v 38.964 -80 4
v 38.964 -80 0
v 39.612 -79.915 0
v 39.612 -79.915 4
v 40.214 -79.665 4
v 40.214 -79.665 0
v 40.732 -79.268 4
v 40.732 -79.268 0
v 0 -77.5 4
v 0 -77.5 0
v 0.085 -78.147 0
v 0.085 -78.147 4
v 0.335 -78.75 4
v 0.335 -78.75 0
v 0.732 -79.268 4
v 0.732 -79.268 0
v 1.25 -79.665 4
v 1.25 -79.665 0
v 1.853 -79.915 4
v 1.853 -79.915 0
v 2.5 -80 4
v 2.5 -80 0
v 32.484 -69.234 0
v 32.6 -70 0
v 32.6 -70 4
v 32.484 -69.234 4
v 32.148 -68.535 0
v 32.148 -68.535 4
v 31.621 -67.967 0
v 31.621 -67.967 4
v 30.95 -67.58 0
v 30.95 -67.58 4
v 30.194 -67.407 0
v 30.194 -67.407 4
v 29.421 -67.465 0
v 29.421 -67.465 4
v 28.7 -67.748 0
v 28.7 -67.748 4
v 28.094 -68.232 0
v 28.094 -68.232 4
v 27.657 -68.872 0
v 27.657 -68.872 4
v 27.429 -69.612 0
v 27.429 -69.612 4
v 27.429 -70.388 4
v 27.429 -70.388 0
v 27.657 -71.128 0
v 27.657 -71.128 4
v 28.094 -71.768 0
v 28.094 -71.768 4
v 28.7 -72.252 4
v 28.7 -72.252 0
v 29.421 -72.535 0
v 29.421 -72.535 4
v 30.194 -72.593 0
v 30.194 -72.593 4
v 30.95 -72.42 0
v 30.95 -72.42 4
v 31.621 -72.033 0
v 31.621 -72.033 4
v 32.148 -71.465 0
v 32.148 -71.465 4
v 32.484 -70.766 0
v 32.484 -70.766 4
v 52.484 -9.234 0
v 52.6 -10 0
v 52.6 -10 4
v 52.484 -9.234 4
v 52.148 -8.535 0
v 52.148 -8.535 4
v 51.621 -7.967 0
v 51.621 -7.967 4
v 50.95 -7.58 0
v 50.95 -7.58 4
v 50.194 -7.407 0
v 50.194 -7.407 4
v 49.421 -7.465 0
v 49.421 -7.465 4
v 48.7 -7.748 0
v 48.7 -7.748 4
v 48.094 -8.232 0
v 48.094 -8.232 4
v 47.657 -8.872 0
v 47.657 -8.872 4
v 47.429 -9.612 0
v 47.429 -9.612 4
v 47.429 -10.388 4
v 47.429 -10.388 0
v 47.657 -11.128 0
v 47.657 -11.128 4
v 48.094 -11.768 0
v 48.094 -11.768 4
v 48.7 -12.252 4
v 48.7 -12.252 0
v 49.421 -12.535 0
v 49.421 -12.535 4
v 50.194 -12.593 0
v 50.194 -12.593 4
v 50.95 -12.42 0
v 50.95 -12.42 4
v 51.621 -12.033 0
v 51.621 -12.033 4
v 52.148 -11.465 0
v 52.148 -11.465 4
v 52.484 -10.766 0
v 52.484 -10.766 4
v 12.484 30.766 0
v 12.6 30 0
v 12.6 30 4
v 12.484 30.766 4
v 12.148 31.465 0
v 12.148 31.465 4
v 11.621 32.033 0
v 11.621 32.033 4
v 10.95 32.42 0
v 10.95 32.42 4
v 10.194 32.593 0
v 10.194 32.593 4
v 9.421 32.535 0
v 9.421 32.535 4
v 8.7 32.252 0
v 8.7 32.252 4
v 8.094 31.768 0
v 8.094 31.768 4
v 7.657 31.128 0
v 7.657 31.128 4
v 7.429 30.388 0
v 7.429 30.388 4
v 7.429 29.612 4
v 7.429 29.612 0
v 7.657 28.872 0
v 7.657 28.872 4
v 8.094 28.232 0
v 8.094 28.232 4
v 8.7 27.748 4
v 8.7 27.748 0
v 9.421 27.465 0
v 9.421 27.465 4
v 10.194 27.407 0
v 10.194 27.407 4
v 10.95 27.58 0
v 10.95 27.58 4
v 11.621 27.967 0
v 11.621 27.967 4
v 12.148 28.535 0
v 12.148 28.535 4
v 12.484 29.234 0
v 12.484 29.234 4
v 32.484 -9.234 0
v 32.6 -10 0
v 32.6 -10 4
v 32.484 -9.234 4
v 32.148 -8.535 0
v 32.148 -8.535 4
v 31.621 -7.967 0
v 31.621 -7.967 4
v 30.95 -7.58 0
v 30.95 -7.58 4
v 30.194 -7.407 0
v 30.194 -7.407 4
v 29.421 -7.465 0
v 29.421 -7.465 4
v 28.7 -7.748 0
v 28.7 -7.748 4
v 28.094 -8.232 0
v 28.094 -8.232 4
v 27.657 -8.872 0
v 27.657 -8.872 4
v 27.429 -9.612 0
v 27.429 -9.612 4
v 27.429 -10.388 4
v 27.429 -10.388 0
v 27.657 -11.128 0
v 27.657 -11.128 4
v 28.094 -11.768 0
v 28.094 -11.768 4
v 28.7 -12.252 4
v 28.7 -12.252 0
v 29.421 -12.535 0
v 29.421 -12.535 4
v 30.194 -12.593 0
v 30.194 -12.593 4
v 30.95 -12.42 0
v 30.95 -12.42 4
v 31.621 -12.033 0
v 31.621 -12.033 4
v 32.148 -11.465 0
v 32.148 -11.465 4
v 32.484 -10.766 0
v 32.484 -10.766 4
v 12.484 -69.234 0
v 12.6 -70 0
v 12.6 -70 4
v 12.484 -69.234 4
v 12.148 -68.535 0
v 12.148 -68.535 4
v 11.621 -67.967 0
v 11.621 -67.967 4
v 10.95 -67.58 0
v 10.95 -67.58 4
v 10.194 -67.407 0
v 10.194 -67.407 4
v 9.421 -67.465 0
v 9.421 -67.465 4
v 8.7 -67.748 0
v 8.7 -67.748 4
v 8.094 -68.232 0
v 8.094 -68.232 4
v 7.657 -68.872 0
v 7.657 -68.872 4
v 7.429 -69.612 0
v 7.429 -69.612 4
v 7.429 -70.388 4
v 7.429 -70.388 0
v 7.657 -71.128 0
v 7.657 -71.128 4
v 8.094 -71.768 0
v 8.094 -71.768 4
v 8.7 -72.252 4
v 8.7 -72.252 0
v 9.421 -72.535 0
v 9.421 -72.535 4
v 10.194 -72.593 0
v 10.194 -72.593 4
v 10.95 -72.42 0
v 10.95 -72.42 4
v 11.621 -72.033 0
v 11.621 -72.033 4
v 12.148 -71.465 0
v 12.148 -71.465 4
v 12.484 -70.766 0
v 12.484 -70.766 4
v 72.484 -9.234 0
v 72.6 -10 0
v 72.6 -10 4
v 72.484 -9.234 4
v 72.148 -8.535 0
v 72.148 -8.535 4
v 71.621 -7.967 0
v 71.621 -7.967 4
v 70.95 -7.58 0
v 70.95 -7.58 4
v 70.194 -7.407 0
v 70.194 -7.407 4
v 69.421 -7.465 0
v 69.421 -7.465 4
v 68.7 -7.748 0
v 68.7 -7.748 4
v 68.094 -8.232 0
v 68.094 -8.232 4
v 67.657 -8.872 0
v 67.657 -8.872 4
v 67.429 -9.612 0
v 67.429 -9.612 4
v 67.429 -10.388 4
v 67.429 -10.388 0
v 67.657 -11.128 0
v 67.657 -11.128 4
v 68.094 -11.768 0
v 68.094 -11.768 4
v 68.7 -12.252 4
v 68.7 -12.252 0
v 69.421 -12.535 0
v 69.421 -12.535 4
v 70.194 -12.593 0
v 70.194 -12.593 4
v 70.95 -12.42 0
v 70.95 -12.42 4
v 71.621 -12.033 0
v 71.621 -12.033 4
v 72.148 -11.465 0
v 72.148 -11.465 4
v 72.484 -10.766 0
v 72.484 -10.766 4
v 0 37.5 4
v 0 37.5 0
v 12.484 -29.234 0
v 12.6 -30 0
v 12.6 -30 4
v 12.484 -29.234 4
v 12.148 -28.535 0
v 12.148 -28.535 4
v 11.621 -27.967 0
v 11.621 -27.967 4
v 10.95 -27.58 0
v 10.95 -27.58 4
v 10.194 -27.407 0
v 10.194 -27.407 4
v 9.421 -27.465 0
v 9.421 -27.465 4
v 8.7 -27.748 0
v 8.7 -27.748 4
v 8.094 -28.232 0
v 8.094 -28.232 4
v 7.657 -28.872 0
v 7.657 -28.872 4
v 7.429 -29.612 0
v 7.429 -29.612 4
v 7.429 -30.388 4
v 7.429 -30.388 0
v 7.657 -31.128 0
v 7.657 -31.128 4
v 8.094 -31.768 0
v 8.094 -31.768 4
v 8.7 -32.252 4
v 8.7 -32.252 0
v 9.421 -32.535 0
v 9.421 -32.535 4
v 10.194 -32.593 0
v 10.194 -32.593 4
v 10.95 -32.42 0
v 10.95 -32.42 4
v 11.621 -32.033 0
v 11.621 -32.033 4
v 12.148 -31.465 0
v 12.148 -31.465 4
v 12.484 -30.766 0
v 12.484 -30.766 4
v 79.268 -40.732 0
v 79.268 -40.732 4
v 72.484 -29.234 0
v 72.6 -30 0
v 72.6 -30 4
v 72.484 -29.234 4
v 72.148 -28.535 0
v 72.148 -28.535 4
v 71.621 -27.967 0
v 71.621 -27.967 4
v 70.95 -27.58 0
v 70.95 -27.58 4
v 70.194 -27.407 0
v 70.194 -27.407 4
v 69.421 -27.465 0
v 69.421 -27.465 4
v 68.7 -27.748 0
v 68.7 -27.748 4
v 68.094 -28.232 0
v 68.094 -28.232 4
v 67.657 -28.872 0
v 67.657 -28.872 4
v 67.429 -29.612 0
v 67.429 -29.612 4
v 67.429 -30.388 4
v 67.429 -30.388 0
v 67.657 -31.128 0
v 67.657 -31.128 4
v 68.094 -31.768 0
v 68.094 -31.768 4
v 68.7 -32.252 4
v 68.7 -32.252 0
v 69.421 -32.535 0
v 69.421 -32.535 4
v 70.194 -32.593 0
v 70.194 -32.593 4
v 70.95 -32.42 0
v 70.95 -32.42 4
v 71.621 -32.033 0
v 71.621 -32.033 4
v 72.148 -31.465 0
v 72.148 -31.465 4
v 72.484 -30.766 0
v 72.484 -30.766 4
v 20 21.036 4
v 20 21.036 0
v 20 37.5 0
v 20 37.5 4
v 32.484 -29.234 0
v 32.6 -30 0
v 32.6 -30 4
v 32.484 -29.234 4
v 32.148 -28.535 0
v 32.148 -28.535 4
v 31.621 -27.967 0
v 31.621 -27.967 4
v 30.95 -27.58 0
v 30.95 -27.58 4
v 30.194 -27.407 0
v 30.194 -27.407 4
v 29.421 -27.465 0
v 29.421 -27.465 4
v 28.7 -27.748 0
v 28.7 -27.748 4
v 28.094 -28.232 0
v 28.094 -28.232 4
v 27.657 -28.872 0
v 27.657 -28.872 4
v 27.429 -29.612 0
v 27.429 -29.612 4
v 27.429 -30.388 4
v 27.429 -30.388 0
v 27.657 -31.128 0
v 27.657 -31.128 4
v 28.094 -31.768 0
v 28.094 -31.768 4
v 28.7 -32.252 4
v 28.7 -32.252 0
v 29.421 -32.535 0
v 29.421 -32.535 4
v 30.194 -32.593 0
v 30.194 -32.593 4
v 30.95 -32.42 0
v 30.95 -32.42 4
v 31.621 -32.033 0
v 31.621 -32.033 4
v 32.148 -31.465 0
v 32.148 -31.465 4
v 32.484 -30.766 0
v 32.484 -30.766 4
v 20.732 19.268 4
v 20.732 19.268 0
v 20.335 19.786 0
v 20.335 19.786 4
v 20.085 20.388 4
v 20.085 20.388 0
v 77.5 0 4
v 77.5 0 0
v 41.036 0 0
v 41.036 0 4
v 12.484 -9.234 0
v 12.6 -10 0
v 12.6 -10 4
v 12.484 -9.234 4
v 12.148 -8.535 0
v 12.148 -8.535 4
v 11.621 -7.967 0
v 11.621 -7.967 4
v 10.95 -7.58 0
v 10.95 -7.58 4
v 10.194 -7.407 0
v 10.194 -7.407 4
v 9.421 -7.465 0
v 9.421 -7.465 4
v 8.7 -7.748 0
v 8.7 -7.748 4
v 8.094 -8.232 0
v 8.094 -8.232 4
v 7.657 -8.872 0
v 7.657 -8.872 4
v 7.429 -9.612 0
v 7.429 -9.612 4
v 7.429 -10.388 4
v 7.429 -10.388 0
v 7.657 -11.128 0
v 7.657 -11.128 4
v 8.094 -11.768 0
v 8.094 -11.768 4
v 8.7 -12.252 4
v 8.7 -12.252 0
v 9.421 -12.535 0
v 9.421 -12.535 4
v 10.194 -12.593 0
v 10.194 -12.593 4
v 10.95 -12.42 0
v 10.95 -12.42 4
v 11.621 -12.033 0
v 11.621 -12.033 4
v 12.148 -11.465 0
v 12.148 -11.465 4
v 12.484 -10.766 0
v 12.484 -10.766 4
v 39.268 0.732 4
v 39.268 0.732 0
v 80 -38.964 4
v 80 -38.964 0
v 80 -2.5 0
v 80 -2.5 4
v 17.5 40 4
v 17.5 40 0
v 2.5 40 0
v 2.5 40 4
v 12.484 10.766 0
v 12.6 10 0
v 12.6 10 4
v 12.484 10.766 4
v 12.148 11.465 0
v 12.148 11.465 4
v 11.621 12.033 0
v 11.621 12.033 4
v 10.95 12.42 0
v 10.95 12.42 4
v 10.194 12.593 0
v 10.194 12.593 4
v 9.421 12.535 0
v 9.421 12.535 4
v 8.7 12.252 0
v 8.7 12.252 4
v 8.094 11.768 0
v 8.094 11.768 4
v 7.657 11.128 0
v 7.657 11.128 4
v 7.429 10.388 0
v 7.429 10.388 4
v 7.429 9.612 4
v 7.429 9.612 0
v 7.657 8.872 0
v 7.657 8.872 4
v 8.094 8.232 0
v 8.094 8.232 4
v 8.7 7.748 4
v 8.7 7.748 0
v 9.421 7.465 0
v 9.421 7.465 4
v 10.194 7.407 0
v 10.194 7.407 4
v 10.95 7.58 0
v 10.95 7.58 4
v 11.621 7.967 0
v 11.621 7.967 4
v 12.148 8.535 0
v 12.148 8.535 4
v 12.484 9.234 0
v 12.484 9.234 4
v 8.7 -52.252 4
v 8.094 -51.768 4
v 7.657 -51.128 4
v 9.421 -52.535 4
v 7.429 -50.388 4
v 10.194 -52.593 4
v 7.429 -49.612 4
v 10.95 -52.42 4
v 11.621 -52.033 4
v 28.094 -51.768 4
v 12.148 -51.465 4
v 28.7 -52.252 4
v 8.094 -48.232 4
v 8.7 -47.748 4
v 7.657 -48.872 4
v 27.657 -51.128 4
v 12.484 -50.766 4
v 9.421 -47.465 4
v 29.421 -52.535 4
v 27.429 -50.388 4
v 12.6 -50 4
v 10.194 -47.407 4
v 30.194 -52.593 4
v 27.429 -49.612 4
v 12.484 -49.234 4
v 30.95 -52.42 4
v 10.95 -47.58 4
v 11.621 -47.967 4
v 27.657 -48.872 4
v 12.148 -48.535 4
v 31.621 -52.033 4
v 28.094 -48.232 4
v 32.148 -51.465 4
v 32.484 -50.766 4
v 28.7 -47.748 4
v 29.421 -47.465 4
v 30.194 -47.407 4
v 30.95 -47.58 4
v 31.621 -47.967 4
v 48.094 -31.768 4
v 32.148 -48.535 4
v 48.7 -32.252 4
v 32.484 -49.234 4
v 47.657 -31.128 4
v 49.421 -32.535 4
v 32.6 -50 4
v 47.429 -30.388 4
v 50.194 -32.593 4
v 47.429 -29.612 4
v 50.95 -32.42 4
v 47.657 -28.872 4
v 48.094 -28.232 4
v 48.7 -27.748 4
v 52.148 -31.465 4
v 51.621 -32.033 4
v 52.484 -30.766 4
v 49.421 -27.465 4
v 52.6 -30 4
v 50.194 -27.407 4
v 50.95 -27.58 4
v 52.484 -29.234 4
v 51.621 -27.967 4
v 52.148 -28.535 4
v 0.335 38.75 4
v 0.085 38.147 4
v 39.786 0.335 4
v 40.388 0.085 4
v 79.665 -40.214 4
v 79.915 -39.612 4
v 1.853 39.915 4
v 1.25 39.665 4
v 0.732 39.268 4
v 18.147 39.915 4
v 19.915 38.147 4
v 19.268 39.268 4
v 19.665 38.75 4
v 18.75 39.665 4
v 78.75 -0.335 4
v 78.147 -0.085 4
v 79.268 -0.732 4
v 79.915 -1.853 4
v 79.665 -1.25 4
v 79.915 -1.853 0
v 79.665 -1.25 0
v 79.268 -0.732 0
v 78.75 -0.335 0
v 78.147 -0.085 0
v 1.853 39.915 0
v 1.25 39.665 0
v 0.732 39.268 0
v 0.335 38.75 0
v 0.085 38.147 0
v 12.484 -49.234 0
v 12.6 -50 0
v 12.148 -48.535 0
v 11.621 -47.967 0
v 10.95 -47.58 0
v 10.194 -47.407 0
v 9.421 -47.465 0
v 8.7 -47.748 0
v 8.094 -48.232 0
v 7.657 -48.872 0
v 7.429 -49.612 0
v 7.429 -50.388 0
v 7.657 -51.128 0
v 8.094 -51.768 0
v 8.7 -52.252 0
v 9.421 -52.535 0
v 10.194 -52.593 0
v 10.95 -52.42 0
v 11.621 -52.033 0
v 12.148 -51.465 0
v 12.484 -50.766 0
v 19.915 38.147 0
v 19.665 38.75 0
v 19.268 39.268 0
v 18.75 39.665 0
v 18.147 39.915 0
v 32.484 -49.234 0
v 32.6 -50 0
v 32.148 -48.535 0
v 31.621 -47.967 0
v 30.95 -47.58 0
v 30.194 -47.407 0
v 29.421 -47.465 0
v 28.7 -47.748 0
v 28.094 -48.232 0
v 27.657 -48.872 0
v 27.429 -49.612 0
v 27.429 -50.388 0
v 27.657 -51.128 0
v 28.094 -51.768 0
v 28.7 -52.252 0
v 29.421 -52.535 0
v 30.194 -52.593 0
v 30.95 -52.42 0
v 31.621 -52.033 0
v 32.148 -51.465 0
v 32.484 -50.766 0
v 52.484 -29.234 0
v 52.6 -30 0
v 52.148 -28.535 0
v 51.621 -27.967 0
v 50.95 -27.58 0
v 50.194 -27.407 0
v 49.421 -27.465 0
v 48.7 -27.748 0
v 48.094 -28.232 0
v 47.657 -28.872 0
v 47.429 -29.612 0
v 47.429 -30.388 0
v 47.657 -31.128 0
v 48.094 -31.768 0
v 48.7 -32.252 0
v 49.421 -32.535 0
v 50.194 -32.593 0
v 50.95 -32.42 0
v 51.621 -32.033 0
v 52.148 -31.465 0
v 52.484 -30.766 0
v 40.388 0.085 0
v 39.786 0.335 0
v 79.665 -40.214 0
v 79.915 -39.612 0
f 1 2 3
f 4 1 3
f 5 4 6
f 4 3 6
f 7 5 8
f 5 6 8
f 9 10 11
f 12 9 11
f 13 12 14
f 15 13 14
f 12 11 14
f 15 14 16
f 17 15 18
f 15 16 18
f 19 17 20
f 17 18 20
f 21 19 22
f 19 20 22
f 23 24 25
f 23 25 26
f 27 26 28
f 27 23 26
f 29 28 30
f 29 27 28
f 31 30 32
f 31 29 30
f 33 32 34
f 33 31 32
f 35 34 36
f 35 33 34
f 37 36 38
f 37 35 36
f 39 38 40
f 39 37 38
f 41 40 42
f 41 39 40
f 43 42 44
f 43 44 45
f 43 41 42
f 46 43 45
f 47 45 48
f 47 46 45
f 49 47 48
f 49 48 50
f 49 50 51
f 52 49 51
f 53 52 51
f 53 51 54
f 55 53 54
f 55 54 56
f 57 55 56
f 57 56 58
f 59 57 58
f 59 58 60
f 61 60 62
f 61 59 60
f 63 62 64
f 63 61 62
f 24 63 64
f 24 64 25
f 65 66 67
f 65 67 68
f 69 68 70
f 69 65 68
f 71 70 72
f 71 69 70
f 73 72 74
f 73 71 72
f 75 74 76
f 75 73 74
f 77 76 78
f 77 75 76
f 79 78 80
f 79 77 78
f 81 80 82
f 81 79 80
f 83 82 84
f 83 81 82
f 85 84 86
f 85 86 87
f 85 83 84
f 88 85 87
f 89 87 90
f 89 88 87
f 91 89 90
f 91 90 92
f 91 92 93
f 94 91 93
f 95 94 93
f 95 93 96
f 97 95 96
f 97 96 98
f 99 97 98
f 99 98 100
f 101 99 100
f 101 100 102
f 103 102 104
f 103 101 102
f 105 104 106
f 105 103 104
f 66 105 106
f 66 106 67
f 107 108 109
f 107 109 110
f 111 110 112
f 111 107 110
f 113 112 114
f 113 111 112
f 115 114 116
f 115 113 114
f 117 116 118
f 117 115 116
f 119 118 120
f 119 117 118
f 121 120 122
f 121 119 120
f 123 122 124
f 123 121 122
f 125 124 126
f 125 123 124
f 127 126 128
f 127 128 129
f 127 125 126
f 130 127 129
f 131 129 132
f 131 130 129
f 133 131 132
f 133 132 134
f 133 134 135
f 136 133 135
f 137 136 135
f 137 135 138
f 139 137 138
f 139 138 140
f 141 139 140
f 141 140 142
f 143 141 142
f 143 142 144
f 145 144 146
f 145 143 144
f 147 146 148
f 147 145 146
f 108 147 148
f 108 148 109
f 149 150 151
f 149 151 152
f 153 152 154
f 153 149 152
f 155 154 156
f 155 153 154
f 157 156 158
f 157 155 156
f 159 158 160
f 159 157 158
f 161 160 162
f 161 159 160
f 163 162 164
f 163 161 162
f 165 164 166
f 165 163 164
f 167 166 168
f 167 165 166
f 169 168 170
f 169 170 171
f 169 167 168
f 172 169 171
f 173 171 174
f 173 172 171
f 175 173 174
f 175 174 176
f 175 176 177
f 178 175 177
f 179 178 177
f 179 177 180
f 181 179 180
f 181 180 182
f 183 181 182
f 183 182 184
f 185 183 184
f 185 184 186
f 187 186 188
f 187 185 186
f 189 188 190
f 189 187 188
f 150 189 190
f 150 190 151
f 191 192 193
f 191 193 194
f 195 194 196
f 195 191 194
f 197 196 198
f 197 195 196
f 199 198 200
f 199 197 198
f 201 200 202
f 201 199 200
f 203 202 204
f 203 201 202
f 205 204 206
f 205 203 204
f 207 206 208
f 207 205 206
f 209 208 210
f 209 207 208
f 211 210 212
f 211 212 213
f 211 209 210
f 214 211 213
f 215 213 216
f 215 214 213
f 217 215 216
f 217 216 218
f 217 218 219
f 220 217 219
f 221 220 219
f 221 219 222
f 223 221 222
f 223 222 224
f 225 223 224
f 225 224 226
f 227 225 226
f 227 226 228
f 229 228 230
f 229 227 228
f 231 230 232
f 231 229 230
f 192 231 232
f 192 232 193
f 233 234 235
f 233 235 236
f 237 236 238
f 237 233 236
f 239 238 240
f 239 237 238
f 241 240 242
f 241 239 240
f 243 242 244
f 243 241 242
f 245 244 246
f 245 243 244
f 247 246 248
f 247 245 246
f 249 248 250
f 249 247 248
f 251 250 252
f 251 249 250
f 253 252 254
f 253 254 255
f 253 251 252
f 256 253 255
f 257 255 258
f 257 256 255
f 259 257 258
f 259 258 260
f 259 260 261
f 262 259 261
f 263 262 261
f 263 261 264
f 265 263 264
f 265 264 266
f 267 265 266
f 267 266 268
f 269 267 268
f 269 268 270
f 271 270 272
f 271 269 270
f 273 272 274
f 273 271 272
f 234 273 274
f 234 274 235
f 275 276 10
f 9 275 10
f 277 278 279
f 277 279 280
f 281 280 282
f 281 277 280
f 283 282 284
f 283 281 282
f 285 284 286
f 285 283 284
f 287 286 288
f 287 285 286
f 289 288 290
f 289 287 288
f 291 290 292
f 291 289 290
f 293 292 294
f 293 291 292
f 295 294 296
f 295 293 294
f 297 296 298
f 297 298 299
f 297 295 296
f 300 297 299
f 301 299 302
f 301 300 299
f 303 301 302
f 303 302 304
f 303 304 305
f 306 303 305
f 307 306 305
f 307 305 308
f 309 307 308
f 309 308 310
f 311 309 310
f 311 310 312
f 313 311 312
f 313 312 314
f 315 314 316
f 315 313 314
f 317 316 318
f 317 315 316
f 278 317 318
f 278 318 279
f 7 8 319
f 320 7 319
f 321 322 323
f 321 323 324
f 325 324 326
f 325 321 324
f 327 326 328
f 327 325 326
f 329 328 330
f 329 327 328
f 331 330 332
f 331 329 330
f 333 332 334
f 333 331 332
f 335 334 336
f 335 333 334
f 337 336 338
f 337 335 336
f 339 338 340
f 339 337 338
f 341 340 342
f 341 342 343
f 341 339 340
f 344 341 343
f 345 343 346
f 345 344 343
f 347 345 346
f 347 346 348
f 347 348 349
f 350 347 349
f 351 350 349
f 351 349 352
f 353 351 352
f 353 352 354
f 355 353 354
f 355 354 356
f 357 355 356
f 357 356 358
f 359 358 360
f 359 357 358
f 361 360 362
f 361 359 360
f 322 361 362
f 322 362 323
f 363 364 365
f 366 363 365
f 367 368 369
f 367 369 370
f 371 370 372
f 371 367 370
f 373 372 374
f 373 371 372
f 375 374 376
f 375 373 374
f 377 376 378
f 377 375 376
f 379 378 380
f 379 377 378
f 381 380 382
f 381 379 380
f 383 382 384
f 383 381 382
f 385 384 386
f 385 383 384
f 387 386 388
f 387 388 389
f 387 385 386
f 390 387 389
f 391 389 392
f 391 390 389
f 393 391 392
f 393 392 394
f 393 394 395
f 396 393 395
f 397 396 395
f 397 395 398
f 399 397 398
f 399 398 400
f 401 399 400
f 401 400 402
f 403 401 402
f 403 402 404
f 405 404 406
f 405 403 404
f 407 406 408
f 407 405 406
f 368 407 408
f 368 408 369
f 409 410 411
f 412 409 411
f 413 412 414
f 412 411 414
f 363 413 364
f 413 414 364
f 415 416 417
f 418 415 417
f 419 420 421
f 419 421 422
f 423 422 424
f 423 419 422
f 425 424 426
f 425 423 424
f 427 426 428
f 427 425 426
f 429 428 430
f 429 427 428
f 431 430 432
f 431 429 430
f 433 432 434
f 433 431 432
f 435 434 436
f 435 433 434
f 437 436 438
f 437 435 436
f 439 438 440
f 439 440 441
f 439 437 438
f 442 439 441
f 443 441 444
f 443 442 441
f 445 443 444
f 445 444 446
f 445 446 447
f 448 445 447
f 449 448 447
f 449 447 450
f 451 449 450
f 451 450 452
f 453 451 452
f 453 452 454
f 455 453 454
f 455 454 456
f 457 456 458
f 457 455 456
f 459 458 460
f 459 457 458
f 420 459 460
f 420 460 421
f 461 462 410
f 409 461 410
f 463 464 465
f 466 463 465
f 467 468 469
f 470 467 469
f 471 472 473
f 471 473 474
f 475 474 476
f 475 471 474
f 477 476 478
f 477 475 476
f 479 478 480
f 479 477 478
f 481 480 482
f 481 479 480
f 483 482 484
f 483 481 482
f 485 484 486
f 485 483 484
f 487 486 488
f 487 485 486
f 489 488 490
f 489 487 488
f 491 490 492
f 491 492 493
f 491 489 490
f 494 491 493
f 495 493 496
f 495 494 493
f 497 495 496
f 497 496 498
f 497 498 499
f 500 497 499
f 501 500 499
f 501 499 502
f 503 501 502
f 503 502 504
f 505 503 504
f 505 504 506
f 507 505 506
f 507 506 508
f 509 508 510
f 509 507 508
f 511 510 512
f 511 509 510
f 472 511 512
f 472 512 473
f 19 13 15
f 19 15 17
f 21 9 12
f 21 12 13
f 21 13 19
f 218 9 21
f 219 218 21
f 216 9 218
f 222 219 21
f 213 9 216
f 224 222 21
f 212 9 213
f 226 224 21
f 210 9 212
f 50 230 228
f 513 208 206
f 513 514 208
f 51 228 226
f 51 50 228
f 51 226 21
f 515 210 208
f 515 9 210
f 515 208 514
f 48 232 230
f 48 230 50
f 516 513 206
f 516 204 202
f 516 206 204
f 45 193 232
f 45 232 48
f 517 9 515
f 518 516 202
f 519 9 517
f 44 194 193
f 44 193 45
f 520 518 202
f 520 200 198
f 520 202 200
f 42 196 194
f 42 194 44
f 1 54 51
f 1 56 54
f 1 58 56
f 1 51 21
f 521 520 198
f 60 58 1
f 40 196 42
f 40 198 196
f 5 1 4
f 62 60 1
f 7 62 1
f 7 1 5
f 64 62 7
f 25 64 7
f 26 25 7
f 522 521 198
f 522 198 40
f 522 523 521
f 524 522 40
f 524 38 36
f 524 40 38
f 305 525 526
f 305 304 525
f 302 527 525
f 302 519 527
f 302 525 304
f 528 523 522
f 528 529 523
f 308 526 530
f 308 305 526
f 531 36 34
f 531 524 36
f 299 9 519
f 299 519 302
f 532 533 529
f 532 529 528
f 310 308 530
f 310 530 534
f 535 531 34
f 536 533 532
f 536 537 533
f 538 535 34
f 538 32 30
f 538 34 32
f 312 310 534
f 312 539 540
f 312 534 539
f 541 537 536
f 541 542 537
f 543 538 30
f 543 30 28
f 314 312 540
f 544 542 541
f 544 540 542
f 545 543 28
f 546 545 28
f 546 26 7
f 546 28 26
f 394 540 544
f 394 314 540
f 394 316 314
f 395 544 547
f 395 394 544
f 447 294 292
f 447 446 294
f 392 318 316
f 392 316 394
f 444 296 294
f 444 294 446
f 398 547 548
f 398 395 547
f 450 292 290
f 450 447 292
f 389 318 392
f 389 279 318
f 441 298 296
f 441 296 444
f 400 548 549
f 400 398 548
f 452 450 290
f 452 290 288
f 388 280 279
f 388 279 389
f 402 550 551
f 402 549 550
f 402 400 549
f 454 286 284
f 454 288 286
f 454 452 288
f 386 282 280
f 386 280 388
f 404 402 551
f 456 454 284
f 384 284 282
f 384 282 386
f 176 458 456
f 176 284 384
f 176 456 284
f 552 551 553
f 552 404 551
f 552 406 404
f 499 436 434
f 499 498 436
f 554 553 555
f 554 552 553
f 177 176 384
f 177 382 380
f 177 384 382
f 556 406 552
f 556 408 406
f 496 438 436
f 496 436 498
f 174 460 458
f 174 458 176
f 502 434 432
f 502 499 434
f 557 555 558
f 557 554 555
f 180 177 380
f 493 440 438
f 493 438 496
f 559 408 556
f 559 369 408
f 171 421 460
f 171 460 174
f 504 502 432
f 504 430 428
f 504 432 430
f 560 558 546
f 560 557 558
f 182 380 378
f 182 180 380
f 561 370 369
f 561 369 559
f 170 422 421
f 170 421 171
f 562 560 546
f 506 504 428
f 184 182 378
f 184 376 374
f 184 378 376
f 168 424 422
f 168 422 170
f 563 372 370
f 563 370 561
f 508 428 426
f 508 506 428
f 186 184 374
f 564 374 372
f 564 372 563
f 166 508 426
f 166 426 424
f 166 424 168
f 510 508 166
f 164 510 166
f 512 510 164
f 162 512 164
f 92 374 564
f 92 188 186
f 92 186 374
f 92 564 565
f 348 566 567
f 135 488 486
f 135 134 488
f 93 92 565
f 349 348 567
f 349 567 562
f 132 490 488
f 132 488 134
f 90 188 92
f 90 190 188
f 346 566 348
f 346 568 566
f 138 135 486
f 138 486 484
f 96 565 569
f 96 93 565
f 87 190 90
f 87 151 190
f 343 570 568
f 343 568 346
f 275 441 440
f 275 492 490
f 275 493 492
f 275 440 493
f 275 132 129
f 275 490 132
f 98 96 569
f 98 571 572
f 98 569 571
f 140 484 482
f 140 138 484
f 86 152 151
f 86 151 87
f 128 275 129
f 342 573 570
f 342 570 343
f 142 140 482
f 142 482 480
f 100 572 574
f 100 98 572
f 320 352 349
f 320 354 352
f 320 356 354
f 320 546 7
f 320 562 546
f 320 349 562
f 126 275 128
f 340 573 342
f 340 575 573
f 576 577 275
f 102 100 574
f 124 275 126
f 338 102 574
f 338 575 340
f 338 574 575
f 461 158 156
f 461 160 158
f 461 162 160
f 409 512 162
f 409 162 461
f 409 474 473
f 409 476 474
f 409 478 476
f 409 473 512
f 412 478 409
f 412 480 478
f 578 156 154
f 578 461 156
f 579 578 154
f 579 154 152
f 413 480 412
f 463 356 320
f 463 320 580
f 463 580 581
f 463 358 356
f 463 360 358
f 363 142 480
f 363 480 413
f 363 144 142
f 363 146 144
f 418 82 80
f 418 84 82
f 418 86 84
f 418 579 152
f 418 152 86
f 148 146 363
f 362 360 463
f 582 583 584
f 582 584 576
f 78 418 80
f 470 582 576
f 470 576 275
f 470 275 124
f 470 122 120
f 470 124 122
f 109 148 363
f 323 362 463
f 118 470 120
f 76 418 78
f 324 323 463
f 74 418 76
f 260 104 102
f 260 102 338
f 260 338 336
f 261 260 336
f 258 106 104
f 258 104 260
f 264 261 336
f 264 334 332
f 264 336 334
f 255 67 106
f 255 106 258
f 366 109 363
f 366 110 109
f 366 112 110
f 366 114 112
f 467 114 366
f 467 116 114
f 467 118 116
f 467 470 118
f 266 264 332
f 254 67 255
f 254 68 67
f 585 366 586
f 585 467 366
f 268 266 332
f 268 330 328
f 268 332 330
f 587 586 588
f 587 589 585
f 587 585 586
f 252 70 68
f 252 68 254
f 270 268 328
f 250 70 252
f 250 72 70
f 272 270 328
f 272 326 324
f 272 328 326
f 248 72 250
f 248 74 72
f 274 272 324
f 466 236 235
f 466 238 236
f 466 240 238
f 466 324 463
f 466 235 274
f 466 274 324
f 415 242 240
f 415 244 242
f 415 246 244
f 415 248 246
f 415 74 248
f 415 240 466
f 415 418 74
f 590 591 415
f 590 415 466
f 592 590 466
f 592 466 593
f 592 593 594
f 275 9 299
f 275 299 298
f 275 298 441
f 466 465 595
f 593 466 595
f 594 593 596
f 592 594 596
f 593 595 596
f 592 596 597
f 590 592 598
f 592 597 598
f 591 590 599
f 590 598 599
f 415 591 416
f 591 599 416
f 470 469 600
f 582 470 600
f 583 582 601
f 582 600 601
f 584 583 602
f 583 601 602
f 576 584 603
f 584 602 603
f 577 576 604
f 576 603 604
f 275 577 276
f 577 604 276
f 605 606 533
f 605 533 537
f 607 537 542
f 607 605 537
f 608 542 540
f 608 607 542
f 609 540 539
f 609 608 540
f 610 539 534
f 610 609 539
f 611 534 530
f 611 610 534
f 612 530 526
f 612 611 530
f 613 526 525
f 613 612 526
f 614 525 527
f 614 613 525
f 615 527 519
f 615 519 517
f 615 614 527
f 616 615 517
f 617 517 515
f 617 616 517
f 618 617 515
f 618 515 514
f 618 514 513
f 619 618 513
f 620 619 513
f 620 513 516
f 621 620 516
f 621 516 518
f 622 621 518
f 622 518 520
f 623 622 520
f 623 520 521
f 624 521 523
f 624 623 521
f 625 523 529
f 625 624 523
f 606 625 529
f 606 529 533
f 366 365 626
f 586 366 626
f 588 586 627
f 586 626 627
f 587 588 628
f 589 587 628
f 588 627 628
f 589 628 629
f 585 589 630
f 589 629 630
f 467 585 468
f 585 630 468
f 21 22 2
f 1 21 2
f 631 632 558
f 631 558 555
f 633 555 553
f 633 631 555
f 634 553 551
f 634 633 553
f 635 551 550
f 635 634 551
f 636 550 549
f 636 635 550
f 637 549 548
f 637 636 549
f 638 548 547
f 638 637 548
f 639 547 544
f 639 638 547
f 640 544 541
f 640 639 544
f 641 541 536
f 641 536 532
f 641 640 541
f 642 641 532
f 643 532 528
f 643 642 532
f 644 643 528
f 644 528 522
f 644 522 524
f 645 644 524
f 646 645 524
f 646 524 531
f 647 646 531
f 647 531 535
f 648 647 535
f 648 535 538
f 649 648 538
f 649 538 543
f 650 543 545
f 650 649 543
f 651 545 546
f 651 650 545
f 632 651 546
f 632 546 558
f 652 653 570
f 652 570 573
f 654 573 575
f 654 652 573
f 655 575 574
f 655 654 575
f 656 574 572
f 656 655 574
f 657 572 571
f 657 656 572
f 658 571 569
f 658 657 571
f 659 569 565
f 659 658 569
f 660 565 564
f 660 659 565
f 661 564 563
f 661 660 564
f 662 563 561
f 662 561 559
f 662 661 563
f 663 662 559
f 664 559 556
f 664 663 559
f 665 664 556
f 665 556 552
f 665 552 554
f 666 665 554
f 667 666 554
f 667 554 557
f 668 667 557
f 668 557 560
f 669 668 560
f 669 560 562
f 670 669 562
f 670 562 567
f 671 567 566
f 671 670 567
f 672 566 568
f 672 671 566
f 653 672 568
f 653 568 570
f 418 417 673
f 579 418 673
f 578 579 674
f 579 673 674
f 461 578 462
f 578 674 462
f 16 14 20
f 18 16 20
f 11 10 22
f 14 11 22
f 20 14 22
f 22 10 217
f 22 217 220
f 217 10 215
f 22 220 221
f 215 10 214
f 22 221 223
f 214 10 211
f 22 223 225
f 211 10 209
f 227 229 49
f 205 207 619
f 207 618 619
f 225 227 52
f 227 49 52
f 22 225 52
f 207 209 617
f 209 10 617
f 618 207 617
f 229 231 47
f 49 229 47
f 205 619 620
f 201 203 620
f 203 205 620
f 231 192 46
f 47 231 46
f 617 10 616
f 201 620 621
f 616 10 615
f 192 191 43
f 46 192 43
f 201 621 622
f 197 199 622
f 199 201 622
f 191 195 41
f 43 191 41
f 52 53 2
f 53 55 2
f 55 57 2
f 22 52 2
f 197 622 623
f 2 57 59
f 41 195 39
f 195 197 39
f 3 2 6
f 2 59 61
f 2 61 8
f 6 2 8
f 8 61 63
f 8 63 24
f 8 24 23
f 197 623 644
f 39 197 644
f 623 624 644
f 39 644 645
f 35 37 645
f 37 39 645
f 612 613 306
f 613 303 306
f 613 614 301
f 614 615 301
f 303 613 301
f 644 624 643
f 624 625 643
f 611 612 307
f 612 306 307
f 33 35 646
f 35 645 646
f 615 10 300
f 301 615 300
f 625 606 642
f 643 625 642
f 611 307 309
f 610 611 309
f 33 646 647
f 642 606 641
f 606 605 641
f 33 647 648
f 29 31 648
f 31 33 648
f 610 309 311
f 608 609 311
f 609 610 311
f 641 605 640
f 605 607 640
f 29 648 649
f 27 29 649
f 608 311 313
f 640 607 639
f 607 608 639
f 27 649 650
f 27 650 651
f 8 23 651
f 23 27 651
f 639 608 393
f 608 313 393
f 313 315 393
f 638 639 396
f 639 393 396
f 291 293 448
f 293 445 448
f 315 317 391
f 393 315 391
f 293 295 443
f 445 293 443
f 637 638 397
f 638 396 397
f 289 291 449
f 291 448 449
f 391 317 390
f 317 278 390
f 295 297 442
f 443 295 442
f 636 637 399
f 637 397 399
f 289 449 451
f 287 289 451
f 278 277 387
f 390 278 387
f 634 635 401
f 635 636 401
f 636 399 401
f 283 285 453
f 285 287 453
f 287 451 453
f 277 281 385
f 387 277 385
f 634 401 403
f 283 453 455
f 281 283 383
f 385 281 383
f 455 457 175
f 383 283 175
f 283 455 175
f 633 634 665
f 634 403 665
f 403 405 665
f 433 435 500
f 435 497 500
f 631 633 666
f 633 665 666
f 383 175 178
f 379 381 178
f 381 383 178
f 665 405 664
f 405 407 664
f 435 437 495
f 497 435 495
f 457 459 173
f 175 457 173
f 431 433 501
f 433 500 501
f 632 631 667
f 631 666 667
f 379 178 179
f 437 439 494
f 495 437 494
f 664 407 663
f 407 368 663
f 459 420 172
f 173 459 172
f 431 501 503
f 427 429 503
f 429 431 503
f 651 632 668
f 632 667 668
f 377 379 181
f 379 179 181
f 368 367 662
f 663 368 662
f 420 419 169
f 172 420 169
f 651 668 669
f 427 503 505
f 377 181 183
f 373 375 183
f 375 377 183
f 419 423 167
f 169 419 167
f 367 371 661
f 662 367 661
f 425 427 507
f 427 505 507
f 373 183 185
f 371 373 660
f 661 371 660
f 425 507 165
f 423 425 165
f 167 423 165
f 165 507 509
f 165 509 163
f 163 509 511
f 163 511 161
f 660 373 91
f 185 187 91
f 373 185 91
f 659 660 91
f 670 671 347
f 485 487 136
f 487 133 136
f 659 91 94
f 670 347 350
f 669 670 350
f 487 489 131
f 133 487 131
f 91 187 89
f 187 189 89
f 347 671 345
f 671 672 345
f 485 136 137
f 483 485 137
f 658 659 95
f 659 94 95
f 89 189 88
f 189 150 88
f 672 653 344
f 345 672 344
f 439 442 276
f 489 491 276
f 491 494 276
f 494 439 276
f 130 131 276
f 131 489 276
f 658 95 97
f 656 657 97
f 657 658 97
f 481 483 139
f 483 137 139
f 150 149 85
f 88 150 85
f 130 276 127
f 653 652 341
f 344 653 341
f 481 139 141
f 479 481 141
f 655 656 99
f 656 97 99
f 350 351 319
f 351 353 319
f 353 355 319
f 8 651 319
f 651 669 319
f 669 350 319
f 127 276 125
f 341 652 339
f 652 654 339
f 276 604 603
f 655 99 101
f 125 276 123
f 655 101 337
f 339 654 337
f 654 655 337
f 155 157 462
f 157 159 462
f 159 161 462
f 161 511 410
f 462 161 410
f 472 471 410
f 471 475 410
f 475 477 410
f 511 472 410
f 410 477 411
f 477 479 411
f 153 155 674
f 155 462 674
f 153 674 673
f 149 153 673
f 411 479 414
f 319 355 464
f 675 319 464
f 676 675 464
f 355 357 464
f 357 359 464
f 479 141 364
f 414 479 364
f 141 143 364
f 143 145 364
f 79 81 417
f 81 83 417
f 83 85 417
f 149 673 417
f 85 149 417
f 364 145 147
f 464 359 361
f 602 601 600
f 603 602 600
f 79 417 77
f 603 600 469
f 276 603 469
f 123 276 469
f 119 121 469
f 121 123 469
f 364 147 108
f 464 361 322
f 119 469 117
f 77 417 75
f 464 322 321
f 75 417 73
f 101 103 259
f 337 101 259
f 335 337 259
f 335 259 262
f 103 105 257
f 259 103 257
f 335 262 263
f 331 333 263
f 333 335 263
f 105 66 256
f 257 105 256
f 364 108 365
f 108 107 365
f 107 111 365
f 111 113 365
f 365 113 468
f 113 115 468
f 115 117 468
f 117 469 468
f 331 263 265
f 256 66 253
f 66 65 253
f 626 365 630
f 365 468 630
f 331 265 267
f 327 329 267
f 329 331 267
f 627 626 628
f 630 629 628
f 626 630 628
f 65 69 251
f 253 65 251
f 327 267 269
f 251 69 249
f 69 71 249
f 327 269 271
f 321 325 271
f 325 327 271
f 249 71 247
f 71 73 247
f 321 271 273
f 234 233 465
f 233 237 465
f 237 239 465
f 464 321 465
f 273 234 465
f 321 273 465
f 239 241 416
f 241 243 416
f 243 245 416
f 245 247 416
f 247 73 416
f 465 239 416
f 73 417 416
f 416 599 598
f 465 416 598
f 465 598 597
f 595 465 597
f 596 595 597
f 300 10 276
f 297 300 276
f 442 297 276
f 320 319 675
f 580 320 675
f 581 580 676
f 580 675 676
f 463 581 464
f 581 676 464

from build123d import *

# Parameters (mm, degrees)
SKETCH_1_R      = 2.6
EXTRUDE_1_DEPTH = 4


with BuildPart() as part:
    # Эскиз1 → Бобышка-Вытянуть1 (new body)
    with BuildSketch(Plane.XY):
        with BuildLine():
            Line((40.732233047, -79.267766953), (79.267766953, -40.732233047))
            ThreePointArc((79.267766953, -40.732233047), (79.809698831, -39.921174675), (80, -38.964466094))
            Line((80, -38.964466094), (80, -2.5))
            ThreePointArc((80, -2.5), (79.267766953, -0.732233047), (77.5, 0))
            Line((77.5, 0), (41.035533906, 0))
            ThreePointArc((41.035533906, 0), (40.078825325, 0.190301169), (39.267766953, 0.732233047))
            Line((39.267766953, 0.732233047), (20.732233047, 19.267766953))
            ThreePointArc((20.732233047, 19.267766953), (20.190301169, 20.078825325), (20, 21.035533906))
            Line((20, 21.035533906), (20, 37.5))
            ThreePointArc((20, 37.5), (19.267766953, 39.267766953), (17.5, 40))
            Line((17.5, 40), (2.5, 40))
            ThreePointArc((2.5, 40), (0.732233047, 39.267766953), (0, 37.5))
            Line((0, 37.5), (0, 0))
            Line((0, 0), (0, -77.5))
            ThreePointArc((0, -77.5), (0.732233047, -79.267766953), (2.5, -80))
            Line((2.5, -80), (38.964466094, -80))
            ThreePointArc((38.964466094, -80), (39.921174675, -79.809698831), (40.732233047, -79.267766953))
        make_face()
        with Locations((10, -10)):
            Circle(SKETCH_1_R, mode=Mode.SUBTRACT)
        with Locations((30, -10)):
            Circle(SKETCH_1_R, mode=Mode.SUBTRACT)
        with Locations((30, -30)):
            Circle(SKETCH_1_R, mode=Mode.SUBTRACT)
        with Locations((30, -50)):
            Circle(SKETCH_1_R, mode=Mode.SUBTRACT)
        with Locations((30, -70)):
            Circle(SKETCH_1_R, mode=Mode.SUBTRACT)
        with Locations((10, -30)):
            Circle(SKETCH_1_R, mode=Mode.SUBTRACT)
        with Locations((10, -50)):
            Circle(SKETCH_1_R, mode=Mode.SUBTRACT)
        with Locations((10, -70)):
            Circle(SKETCH_1_R, mode=Mode.SUBTRACT)
        with Locations((50, -10)):
            Circle(SKETCH_1_R, mode=Mode.SUBTRACT)
        with Locations((50, -30)):
            Circle(SKETCH_1_R, mode=Mode.SUBTRACT)
        with Locations((70, -10)):
            Circle(SKETCH_1_R, mode=Mode.SUBTRACT)
        with Locations((70, -30)):
            Circle(SKETCH_1_R, mode=Mode.SUBTRACT)
        with Locations((10, 10)):
            Circle(SKETCH_1_R, mode=Mode.SUBTRACT)
        with Locations((10, 30)):
            Circle(SKETCH_1_R, mode=Mode.SUBTRACT)
    extrude(amount=EXTRUDE_1_DEPTH)


solid = part.part
